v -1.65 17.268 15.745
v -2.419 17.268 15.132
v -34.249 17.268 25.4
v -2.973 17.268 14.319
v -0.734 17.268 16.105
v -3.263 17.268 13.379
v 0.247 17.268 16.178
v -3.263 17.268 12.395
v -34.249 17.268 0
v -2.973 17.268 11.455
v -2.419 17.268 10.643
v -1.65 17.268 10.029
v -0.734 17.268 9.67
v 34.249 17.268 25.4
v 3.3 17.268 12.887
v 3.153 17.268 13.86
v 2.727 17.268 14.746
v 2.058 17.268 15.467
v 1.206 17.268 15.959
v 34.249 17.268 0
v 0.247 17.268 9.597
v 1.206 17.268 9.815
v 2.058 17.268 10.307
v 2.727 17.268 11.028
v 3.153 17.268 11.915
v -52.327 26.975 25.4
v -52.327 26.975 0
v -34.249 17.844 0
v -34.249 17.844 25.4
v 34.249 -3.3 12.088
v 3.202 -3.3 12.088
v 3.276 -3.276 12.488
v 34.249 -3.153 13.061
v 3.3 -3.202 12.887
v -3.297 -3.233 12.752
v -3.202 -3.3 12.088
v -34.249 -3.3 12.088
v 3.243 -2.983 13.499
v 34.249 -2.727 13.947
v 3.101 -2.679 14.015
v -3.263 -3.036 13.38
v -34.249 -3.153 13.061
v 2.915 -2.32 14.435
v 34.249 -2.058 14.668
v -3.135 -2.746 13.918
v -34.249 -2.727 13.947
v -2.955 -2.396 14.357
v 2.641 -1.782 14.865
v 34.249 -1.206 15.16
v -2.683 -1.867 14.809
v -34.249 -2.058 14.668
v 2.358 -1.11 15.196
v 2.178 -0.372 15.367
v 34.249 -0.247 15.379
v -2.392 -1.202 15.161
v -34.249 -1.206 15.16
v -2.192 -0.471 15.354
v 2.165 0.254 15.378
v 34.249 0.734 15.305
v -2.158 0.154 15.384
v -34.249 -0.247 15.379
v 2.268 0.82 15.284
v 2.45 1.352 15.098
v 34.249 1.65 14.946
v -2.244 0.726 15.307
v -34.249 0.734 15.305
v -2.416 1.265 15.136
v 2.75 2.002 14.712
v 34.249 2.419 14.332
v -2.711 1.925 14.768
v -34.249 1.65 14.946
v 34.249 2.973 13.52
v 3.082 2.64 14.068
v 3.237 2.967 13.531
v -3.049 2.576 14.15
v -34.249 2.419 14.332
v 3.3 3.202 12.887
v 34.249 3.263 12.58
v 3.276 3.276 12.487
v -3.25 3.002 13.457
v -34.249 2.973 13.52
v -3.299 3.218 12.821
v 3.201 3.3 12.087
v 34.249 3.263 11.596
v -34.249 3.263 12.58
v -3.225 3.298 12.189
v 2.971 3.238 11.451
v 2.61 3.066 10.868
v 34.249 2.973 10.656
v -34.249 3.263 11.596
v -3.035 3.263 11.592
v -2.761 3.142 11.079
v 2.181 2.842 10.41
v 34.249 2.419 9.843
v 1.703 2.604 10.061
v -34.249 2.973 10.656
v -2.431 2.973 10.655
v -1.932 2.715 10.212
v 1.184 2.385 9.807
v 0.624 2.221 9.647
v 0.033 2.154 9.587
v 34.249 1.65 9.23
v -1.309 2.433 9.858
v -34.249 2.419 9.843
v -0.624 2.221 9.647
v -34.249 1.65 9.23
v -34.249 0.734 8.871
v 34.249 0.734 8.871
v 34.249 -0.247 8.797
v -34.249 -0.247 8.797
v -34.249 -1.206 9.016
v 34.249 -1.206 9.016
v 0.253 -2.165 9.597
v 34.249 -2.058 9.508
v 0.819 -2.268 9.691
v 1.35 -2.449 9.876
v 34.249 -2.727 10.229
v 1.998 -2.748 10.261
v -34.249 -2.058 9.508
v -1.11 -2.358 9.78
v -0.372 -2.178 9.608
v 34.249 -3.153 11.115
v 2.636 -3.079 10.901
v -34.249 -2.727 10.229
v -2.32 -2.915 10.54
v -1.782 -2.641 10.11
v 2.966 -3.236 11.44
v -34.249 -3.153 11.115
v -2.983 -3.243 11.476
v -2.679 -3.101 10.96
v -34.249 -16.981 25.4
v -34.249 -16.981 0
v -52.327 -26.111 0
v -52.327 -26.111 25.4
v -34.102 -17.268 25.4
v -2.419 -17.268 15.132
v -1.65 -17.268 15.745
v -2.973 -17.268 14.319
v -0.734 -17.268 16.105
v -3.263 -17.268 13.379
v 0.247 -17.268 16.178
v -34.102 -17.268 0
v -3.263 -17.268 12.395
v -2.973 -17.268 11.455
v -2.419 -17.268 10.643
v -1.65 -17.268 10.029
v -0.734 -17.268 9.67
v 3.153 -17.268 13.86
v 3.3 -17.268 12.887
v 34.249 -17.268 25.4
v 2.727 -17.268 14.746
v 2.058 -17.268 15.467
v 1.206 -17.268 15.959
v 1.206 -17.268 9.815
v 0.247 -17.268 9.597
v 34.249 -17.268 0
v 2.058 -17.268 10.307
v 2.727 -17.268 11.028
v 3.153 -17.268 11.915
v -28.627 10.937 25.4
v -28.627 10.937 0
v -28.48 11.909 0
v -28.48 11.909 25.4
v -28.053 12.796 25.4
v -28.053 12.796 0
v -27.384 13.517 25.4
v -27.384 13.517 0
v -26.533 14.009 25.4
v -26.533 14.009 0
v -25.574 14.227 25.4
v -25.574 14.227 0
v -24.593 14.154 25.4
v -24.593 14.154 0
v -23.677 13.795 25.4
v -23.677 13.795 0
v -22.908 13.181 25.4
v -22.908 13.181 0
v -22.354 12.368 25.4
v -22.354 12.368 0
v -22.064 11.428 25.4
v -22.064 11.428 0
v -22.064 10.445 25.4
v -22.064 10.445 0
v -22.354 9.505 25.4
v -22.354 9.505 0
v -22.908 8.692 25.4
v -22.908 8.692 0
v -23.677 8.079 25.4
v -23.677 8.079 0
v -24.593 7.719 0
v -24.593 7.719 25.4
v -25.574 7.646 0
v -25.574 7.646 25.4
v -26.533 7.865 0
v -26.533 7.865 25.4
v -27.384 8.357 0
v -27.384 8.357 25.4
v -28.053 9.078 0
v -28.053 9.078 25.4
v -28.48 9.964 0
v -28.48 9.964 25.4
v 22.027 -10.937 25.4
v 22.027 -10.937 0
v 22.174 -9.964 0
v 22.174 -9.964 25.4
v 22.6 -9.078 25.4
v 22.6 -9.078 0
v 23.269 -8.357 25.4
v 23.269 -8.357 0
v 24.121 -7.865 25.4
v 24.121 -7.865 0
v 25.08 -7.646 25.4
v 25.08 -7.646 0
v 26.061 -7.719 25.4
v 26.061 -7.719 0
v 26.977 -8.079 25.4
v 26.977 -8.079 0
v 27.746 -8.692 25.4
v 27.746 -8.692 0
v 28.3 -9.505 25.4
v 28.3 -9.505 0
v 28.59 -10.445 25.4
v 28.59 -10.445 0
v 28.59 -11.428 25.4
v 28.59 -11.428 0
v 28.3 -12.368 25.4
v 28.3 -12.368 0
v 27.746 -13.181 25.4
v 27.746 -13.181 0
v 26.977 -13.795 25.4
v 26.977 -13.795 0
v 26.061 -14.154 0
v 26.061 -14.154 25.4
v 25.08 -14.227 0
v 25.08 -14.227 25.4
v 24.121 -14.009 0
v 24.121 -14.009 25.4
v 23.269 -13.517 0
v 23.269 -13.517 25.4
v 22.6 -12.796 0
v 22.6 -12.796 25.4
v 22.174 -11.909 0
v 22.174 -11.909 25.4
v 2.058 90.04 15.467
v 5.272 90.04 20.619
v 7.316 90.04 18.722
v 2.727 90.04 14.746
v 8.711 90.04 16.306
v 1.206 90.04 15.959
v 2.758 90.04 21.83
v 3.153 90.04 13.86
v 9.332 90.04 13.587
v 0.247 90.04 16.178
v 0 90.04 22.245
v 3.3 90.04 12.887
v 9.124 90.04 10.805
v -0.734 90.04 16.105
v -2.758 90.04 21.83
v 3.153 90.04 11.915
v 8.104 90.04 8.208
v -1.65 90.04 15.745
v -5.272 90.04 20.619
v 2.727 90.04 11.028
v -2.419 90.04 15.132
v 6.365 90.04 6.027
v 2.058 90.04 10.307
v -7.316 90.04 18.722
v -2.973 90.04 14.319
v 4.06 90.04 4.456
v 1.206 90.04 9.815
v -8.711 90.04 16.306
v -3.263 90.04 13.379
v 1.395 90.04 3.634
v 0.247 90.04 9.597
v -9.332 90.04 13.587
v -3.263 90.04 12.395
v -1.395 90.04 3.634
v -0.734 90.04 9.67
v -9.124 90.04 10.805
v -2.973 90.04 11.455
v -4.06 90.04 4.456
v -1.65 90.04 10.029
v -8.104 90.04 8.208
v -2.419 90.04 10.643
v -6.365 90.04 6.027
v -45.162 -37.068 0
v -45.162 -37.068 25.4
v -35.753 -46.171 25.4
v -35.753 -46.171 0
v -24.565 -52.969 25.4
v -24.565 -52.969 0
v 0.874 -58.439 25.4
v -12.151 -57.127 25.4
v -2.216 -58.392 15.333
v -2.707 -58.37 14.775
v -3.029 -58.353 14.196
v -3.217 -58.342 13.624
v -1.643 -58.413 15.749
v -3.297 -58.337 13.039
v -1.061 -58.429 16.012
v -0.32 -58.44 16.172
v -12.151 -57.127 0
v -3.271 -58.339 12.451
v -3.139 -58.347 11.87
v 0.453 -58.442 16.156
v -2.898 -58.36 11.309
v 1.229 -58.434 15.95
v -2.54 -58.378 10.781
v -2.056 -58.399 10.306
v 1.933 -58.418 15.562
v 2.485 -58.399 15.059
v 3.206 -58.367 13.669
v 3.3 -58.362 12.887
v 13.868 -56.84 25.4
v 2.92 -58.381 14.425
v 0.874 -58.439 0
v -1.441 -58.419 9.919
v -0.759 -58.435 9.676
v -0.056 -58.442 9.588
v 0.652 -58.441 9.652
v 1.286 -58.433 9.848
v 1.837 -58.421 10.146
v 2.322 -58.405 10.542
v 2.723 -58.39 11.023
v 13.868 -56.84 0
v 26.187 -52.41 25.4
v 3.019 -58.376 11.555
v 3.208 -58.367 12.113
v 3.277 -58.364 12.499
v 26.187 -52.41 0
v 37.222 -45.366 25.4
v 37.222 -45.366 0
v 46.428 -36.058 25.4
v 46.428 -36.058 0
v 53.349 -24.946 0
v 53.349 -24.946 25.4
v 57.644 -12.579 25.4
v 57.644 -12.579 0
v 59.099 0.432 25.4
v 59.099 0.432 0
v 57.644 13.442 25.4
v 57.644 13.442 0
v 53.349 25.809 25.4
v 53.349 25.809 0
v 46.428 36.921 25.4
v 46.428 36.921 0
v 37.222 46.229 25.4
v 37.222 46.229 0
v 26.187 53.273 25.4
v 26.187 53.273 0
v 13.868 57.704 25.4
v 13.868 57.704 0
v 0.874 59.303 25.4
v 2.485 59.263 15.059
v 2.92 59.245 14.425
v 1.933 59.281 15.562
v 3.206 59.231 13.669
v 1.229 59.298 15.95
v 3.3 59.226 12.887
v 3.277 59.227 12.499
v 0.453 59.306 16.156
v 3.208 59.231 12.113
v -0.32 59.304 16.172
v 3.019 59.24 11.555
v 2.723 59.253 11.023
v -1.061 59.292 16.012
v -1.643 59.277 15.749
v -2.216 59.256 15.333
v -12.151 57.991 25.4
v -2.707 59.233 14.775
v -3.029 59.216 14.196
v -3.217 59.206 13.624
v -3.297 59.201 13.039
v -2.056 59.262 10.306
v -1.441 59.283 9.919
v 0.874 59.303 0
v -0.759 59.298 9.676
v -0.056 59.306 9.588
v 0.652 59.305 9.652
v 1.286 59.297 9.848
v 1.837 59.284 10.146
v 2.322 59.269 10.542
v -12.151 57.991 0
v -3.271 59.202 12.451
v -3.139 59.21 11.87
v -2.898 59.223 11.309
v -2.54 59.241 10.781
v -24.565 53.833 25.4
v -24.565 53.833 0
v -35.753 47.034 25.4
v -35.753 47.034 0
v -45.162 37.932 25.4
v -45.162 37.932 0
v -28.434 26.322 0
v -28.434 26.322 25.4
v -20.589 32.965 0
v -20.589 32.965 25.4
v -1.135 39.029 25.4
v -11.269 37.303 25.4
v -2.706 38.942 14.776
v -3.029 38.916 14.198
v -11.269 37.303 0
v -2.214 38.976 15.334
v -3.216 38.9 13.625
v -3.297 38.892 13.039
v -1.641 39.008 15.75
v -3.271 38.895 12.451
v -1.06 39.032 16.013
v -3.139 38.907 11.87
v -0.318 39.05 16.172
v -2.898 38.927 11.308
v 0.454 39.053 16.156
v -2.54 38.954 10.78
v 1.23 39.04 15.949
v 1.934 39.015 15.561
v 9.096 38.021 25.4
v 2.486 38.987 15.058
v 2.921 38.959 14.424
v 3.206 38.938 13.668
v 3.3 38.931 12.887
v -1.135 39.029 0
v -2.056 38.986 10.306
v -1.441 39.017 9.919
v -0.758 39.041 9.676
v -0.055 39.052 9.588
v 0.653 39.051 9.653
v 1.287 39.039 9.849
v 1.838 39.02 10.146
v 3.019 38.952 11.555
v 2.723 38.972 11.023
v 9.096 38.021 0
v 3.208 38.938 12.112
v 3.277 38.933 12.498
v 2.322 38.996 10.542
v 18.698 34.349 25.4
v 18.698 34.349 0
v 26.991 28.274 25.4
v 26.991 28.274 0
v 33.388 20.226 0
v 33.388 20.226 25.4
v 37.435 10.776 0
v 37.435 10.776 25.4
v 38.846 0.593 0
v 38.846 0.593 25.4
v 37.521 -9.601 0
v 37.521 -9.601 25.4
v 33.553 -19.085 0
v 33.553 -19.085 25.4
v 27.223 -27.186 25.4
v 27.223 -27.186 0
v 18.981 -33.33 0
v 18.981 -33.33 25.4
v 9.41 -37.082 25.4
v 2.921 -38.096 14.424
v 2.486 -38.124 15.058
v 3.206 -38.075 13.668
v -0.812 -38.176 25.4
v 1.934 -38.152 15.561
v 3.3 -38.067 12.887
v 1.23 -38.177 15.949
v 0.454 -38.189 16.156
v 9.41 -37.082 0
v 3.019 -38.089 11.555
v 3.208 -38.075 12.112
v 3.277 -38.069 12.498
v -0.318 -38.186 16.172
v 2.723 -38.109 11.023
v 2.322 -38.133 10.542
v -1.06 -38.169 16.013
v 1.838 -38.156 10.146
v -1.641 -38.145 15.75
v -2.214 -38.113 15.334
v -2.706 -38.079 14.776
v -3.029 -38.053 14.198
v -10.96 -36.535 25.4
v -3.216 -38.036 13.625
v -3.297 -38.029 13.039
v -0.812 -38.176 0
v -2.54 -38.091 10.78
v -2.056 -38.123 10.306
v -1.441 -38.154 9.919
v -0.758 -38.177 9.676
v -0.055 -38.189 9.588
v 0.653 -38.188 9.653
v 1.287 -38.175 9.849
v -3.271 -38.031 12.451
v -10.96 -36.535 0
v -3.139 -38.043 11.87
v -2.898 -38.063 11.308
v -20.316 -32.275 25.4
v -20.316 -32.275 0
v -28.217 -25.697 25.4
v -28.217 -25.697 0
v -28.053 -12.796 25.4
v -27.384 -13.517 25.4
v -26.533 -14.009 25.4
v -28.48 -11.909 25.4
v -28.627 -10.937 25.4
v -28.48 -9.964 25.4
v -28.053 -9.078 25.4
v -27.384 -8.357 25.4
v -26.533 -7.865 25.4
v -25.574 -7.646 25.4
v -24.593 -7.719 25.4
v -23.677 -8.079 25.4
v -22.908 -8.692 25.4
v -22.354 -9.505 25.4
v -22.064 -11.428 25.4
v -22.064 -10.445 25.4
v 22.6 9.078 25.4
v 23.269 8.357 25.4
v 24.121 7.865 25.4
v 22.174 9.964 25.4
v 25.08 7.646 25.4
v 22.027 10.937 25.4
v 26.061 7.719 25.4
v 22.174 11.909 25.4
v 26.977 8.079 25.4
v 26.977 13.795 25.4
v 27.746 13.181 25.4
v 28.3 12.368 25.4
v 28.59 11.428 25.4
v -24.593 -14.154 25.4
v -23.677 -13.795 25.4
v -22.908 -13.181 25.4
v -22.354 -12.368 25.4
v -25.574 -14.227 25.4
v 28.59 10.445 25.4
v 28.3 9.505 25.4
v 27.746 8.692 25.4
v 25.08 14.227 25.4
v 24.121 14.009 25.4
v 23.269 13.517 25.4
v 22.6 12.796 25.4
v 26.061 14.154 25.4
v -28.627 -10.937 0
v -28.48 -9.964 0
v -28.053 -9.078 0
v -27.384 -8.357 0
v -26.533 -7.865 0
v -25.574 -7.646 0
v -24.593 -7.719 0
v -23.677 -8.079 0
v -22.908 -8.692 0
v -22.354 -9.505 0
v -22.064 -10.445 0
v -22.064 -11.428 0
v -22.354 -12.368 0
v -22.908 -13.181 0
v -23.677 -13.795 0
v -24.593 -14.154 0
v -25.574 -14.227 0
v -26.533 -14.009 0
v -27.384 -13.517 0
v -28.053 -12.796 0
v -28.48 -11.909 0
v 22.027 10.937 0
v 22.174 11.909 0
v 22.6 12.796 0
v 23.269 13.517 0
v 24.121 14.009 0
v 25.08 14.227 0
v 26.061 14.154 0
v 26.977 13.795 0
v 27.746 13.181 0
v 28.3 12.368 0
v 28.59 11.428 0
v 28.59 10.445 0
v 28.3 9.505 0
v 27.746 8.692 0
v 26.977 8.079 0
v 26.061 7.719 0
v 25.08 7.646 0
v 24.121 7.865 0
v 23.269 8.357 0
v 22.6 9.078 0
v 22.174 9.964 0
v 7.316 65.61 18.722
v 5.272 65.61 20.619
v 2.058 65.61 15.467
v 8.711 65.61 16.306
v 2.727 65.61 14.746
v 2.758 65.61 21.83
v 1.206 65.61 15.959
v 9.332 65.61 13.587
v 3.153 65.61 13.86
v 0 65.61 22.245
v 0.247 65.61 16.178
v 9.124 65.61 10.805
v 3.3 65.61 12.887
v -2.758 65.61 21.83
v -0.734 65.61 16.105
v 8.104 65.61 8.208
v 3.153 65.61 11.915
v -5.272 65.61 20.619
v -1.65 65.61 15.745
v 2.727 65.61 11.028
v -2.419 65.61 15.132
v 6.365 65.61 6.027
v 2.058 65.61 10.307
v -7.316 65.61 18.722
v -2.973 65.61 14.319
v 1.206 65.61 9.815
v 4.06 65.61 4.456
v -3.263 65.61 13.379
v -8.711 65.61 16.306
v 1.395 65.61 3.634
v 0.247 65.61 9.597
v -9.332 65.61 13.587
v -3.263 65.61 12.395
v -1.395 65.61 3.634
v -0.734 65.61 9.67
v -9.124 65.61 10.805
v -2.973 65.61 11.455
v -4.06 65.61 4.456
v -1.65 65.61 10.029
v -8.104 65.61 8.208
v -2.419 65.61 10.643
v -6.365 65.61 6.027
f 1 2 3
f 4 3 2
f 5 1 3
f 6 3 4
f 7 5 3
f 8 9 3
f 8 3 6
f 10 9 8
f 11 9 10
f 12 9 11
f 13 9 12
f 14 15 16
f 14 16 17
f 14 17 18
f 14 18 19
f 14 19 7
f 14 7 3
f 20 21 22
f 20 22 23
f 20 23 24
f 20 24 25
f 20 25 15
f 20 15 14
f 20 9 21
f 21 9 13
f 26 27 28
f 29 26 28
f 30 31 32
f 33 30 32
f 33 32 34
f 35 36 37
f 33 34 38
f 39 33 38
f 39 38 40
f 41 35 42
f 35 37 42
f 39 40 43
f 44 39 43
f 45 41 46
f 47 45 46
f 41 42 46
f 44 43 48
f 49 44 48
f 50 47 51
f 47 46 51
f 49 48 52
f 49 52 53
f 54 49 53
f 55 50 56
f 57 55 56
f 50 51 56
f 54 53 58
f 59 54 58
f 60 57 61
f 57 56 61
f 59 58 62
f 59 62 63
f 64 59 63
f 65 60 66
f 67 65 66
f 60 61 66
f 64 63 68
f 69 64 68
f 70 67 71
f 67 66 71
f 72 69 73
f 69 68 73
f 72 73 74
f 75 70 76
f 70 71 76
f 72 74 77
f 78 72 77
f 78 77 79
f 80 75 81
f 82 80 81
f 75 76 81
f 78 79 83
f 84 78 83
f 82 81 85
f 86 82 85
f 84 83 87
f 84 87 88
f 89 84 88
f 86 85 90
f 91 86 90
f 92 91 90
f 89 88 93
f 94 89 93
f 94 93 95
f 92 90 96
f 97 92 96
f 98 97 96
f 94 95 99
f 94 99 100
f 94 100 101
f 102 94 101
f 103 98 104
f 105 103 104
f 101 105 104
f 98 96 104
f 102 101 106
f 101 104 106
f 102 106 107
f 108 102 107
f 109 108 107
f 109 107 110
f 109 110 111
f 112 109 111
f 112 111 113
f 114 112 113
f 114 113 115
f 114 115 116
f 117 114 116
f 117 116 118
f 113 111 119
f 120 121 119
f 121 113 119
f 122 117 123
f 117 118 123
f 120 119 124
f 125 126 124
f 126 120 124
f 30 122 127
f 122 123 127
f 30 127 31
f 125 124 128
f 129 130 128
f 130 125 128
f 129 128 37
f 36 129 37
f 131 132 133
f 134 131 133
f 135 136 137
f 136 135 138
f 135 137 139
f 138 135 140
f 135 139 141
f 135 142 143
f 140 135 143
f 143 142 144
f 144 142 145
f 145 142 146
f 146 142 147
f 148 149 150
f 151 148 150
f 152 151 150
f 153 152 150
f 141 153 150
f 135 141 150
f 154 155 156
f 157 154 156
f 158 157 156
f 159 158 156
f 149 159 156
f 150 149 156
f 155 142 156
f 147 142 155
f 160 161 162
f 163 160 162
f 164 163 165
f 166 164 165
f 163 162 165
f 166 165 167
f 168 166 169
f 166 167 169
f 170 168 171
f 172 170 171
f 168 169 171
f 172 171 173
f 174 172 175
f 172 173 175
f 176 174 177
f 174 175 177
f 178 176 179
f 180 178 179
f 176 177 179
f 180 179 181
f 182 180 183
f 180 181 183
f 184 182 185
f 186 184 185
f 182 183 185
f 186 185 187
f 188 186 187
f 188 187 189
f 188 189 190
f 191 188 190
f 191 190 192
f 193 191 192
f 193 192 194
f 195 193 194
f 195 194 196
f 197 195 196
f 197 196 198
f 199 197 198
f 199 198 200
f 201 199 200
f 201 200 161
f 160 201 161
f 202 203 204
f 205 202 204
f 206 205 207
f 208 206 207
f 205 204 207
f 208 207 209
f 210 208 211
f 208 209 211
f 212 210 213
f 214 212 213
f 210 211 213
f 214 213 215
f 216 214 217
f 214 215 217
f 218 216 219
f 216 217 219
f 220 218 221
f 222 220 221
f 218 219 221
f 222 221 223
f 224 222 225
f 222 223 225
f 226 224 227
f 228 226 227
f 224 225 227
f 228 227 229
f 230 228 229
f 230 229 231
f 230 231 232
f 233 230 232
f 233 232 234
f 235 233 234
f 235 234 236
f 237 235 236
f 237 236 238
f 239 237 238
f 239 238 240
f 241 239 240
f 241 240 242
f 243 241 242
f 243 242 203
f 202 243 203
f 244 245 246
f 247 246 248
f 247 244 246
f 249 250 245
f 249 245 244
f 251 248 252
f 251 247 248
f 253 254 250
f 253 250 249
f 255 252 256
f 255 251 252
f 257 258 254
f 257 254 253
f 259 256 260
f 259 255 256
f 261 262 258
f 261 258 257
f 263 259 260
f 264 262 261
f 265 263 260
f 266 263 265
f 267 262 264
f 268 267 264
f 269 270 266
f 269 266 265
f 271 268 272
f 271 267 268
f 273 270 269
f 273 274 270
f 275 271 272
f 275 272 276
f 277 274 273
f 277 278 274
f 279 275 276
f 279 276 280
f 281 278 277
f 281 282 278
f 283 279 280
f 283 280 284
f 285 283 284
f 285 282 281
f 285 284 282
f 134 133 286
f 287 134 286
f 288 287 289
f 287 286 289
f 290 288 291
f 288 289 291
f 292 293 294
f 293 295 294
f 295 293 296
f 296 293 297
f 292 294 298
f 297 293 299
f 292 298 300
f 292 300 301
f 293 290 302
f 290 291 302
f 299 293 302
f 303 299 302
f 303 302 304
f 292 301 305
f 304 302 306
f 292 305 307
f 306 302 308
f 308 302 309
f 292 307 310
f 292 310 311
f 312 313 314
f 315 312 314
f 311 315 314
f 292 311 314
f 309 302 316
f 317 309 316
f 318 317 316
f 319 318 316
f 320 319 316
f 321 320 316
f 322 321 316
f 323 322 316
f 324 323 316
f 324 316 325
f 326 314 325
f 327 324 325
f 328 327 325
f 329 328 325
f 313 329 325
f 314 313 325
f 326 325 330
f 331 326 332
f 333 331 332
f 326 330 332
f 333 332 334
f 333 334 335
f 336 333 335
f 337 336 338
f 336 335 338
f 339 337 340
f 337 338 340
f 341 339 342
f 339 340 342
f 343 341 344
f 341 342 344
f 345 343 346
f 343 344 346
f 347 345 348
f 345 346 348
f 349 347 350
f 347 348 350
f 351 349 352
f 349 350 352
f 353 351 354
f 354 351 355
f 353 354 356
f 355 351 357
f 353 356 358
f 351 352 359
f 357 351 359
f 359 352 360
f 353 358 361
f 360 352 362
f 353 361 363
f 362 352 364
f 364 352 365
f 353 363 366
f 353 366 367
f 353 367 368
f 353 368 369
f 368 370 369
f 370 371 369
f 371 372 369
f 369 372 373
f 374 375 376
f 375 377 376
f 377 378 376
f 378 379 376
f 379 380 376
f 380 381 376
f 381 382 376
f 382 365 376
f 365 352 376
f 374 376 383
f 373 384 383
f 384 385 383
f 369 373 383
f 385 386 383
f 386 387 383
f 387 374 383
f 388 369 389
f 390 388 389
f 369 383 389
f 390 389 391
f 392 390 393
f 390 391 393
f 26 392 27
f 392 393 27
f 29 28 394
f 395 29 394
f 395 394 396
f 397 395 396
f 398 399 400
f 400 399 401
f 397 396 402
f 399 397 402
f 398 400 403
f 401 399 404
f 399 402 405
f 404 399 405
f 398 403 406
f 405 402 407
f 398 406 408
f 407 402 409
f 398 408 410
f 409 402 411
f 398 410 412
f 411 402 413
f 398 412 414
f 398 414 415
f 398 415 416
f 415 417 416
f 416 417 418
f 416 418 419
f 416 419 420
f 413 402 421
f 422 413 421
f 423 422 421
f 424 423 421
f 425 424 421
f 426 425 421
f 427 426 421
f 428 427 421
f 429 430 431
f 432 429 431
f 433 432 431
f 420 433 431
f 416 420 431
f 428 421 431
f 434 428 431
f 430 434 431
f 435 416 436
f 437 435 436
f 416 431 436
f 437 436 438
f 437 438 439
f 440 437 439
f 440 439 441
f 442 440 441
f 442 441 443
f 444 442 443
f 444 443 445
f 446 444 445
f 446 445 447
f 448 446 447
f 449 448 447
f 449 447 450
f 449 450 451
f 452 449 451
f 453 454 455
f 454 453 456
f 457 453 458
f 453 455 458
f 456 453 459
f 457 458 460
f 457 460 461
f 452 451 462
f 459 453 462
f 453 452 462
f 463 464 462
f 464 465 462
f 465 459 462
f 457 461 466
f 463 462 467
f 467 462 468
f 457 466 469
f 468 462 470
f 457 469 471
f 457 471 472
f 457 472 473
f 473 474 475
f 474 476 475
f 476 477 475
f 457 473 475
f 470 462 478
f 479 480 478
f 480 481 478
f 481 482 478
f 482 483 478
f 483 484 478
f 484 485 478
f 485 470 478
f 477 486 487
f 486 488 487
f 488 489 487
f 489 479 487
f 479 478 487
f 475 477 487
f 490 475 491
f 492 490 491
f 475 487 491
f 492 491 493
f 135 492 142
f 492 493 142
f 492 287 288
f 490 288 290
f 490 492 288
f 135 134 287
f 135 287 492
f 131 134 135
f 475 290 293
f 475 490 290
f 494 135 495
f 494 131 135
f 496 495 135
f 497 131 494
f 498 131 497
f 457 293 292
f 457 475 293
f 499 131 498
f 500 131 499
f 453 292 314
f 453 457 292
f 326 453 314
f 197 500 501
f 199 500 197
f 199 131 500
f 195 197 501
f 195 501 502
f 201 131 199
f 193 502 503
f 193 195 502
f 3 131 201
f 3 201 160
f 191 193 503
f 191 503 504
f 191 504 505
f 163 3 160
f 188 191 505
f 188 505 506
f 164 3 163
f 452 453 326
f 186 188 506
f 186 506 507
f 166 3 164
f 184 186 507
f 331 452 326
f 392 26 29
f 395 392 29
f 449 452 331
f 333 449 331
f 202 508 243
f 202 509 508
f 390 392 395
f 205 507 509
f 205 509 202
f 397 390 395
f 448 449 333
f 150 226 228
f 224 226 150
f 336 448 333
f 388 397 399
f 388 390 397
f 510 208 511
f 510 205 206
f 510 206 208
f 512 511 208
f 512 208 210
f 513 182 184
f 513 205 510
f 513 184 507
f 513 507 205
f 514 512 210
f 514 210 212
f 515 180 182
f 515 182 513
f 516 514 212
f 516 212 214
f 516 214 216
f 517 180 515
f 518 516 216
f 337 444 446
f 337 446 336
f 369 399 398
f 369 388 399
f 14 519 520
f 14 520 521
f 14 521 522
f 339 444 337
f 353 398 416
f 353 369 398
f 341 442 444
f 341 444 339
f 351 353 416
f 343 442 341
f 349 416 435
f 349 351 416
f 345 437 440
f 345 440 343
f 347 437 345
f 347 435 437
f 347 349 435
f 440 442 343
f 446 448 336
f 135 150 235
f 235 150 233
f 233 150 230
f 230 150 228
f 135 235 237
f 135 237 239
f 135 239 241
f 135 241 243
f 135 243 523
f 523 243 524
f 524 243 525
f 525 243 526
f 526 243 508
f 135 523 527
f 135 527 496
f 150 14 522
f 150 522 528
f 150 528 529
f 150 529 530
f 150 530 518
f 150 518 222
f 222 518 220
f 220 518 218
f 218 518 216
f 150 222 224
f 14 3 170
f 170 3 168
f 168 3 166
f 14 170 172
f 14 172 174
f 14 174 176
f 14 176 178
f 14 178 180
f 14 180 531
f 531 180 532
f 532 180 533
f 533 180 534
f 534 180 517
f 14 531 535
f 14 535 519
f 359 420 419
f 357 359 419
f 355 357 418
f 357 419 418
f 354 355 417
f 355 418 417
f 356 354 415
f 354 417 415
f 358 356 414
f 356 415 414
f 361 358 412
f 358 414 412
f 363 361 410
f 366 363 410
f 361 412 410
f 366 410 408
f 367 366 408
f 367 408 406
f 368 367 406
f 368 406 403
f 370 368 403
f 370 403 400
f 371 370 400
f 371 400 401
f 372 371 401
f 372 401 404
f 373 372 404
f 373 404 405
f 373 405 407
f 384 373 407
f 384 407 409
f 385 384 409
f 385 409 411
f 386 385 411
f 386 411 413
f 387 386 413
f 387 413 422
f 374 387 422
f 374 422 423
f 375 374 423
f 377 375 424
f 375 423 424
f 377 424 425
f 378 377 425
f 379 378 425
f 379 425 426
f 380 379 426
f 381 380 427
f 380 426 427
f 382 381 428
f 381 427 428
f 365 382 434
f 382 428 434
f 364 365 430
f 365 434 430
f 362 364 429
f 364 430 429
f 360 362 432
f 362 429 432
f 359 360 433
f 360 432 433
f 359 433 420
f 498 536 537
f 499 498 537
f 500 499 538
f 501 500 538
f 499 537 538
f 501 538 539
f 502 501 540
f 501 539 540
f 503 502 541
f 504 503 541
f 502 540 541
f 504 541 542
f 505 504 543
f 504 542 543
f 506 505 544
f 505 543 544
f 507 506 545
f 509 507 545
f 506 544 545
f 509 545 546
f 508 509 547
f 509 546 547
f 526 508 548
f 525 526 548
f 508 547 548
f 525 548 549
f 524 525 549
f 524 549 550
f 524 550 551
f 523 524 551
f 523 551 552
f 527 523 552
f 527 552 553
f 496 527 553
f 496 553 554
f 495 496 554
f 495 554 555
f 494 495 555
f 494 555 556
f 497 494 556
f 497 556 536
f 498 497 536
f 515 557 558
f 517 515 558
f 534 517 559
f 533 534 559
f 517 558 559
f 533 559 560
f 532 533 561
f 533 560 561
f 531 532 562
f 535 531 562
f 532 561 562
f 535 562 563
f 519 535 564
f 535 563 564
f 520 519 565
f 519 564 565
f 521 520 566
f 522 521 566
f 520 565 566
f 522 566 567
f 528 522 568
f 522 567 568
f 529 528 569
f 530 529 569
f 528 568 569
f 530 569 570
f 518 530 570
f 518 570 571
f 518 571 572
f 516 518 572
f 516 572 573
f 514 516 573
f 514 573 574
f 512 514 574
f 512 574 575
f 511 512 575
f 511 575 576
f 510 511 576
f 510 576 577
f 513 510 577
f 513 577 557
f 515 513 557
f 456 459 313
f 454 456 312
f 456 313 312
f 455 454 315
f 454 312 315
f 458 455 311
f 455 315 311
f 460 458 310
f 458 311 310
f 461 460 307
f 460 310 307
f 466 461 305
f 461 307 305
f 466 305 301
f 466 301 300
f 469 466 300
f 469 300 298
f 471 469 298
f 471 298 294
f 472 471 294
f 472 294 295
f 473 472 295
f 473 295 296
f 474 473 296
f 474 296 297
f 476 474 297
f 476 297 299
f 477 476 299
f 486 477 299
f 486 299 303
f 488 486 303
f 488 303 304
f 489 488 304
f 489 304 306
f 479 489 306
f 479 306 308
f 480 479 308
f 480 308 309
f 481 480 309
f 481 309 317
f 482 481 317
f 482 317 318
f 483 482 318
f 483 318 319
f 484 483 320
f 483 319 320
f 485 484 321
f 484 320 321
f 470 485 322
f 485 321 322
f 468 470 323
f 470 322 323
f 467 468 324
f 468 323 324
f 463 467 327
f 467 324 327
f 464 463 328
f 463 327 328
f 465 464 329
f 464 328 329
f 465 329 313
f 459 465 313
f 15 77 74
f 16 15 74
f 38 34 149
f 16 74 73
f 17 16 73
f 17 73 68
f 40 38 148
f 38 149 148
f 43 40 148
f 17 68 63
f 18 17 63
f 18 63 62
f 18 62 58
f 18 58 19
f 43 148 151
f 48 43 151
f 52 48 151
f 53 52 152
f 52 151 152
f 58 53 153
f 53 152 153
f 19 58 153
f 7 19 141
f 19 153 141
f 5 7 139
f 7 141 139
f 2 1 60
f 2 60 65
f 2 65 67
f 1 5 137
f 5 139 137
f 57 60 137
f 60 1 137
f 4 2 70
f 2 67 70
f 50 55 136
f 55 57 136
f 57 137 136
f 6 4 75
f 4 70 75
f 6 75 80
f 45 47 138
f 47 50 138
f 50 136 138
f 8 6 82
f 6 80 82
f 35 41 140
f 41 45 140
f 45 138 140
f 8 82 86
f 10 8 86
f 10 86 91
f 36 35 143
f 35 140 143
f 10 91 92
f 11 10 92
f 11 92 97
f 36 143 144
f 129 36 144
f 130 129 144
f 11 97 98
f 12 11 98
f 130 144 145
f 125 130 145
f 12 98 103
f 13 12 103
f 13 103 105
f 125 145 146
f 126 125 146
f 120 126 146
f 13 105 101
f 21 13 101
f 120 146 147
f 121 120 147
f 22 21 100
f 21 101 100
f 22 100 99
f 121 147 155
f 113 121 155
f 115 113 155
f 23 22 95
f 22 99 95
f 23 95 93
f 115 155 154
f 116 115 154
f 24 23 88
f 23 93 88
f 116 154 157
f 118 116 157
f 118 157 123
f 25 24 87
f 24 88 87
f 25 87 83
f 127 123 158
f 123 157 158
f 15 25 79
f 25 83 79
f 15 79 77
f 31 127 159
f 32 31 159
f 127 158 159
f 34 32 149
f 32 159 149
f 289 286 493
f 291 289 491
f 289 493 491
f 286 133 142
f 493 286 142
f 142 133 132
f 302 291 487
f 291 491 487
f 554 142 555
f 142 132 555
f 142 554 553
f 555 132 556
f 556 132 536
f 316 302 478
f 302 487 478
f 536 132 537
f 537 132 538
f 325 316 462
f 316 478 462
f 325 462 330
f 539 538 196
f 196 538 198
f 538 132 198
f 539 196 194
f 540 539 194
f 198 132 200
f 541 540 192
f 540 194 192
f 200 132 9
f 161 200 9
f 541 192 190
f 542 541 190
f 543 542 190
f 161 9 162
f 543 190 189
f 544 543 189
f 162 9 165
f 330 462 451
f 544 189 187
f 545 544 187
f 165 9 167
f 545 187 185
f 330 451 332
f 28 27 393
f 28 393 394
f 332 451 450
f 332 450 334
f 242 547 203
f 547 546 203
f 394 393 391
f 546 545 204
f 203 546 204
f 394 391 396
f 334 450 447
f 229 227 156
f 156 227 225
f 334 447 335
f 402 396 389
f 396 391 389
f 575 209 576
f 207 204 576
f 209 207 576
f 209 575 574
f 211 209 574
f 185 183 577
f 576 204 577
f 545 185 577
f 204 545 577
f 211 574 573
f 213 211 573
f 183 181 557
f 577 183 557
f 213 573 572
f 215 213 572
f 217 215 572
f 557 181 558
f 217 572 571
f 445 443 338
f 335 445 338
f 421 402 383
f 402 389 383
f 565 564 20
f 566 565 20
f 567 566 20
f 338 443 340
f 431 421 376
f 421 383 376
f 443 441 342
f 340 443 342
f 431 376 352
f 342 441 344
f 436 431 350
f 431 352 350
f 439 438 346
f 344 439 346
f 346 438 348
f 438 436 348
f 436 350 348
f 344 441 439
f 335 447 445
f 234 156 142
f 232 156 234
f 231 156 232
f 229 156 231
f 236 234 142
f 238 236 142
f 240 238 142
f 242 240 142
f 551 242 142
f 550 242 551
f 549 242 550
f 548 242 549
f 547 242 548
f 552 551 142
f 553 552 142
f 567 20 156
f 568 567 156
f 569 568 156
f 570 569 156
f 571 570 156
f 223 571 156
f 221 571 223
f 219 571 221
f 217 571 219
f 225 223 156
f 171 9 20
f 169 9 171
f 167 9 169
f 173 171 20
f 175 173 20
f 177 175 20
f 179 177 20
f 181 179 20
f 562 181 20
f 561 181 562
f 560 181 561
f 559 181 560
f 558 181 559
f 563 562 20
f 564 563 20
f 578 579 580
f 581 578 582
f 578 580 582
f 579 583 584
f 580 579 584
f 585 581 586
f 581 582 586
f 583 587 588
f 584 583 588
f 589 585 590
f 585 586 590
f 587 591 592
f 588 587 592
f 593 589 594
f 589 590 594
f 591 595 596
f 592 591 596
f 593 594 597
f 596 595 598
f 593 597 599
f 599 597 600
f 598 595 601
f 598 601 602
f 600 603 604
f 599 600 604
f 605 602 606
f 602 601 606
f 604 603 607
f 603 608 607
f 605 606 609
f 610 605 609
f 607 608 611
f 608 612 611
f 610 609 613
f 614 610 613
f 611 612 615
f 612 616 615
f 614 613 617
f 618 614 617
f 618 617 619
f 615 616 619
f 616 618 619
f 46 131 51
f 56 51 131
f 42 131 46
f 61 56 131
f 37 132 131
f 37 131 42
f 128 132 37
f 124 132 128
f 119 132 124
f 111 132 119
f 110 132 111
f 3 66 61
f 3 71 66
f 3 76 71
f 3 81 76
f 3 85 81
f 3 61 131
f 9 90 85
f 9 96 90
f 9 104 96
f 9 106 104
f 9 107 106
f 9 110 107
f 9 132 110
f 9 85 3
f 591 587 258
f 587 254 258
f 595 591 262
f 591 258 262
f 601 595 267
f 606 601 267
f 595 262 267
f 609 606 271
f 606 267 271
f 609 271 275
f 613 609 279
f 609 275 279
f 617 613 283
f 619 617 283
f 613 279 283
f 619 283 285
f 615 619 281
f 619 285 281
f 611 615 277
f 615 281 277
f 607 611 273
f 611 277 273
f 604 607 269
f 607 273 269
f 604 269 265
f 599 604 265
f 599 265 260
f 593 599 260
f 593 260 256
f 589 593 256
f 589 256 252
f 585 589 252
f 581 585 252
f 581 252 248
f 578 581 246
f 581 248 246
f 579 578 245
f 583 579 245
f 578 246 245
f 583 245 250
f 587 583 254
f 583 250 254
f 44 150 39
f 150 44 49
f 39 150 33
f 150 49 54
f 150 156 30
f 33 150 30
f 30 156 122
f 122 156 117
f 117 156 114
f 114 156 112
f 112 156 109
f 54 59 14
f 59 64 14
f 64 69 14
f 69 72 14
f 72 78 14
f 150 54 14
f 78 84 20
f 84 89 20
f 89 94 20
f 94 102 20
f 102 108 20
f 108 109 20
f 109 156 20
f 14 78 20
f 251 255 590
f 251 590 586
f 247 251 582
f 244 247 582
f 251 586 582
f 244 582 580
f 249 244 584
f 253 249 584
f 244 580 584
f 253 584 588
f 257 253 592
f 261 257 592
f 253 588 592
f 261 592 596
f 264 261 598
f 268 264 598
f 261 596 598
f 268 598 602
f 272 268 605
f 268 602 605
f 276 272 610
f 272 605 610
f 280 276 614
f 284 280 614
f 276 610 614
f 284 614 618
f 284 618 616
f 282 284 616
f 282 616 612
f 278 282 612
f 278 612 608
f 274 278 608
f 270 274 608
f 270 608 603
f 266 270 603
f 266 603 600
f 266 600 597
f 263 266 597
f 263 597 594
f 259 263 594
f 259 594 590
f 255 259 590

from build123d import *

# Parameters (mm, degrees)
F0_W     = 68.4977695346
F0_H     = 34.5366895199
F1_DEPTH = 25.4
F3_D     = 6.6
F5_D     = 6.6
F7_DEPTH = 25.4
F8_W     = 24.4304622273
F8_H     = 9.358138208
F11_D    = 6.6
F11_2_D  = 6.6


with BuildPart() as f1:
    # F0 (on Top) → F1 (new body)
    with BuildSketch(Plane.XY):
        Rectangle(F0_W, F0_H)
    extrude(amount=F1_DEPTH)

    # F3 (through all)
    with Locations(Plane.XY.offset(25.4)):
        with Locations((-25.3269076347, 10.9366187826), (25.3269076347, 10.9366187826), (25.3269076347, -10.9366187826), (-25.3269076347, -10.9366187826)):
            Hole(F3_D / 2)

    # F5 (through all)
    with Locations(Plane.YZ.offset(34.2488847673)):
        with Locations((0, 12.0878415182)):
            Hole(F5_D / 2)

    # F6 (on Top) → F7 (join)
    with BuildSketch(Plane.XY):
        with BuildLine():
            ThreePointArc((-34.2488847673, 17.8439561278), (38.8465475208, 0.4317080602), (-34.2488847673, -16.9805400074))
            Line((-34.2488847673, -16.9805400074), (-52.326727178, -26.1114104342))
            ThreePointArc((-52.326727178, -26.1114104342), (59.0994777034, 0.4317080602), (-52.326727178, 26.9748265546))
            Line((-52.326727178, 26.9748265546), (-34.2488847673, 17.8439561278))
        make_face()
    extrude(amount=F7_DEPTH)

    # F11 (through all)
    with Locations(Plane(origin=(0, 90.0401915764, 0), x_dir=(-1, 0, 0), z_dir=(0, 1, 0))):
        with Locations((0, 12.8872906789)):
            Hole(F11_D / 2)


with BuildPart() as f9:
    # F8 (on Right) → F9 (revolve)
    with BuildSketch(Plane.YZ):
        with Locations((77.8249604627, 17.5663597829)):
            Rectangle(F8_W, F8_H)
    revolve(axis=Axis((0, 77.8249604627, 12.8872906789), (0, -1, 0)))

    # F11#2 (through all)
    with Locations(Plane(origin=(0, 90.0401915764, 0), x_dir=(-1, 0, 0), z_dir=(0, 1, 0))):
        with Locations((0, 12.8872906789)):
            Hole(F11_2_D / 2)


solid = Compound([f1.part, f9.part])
